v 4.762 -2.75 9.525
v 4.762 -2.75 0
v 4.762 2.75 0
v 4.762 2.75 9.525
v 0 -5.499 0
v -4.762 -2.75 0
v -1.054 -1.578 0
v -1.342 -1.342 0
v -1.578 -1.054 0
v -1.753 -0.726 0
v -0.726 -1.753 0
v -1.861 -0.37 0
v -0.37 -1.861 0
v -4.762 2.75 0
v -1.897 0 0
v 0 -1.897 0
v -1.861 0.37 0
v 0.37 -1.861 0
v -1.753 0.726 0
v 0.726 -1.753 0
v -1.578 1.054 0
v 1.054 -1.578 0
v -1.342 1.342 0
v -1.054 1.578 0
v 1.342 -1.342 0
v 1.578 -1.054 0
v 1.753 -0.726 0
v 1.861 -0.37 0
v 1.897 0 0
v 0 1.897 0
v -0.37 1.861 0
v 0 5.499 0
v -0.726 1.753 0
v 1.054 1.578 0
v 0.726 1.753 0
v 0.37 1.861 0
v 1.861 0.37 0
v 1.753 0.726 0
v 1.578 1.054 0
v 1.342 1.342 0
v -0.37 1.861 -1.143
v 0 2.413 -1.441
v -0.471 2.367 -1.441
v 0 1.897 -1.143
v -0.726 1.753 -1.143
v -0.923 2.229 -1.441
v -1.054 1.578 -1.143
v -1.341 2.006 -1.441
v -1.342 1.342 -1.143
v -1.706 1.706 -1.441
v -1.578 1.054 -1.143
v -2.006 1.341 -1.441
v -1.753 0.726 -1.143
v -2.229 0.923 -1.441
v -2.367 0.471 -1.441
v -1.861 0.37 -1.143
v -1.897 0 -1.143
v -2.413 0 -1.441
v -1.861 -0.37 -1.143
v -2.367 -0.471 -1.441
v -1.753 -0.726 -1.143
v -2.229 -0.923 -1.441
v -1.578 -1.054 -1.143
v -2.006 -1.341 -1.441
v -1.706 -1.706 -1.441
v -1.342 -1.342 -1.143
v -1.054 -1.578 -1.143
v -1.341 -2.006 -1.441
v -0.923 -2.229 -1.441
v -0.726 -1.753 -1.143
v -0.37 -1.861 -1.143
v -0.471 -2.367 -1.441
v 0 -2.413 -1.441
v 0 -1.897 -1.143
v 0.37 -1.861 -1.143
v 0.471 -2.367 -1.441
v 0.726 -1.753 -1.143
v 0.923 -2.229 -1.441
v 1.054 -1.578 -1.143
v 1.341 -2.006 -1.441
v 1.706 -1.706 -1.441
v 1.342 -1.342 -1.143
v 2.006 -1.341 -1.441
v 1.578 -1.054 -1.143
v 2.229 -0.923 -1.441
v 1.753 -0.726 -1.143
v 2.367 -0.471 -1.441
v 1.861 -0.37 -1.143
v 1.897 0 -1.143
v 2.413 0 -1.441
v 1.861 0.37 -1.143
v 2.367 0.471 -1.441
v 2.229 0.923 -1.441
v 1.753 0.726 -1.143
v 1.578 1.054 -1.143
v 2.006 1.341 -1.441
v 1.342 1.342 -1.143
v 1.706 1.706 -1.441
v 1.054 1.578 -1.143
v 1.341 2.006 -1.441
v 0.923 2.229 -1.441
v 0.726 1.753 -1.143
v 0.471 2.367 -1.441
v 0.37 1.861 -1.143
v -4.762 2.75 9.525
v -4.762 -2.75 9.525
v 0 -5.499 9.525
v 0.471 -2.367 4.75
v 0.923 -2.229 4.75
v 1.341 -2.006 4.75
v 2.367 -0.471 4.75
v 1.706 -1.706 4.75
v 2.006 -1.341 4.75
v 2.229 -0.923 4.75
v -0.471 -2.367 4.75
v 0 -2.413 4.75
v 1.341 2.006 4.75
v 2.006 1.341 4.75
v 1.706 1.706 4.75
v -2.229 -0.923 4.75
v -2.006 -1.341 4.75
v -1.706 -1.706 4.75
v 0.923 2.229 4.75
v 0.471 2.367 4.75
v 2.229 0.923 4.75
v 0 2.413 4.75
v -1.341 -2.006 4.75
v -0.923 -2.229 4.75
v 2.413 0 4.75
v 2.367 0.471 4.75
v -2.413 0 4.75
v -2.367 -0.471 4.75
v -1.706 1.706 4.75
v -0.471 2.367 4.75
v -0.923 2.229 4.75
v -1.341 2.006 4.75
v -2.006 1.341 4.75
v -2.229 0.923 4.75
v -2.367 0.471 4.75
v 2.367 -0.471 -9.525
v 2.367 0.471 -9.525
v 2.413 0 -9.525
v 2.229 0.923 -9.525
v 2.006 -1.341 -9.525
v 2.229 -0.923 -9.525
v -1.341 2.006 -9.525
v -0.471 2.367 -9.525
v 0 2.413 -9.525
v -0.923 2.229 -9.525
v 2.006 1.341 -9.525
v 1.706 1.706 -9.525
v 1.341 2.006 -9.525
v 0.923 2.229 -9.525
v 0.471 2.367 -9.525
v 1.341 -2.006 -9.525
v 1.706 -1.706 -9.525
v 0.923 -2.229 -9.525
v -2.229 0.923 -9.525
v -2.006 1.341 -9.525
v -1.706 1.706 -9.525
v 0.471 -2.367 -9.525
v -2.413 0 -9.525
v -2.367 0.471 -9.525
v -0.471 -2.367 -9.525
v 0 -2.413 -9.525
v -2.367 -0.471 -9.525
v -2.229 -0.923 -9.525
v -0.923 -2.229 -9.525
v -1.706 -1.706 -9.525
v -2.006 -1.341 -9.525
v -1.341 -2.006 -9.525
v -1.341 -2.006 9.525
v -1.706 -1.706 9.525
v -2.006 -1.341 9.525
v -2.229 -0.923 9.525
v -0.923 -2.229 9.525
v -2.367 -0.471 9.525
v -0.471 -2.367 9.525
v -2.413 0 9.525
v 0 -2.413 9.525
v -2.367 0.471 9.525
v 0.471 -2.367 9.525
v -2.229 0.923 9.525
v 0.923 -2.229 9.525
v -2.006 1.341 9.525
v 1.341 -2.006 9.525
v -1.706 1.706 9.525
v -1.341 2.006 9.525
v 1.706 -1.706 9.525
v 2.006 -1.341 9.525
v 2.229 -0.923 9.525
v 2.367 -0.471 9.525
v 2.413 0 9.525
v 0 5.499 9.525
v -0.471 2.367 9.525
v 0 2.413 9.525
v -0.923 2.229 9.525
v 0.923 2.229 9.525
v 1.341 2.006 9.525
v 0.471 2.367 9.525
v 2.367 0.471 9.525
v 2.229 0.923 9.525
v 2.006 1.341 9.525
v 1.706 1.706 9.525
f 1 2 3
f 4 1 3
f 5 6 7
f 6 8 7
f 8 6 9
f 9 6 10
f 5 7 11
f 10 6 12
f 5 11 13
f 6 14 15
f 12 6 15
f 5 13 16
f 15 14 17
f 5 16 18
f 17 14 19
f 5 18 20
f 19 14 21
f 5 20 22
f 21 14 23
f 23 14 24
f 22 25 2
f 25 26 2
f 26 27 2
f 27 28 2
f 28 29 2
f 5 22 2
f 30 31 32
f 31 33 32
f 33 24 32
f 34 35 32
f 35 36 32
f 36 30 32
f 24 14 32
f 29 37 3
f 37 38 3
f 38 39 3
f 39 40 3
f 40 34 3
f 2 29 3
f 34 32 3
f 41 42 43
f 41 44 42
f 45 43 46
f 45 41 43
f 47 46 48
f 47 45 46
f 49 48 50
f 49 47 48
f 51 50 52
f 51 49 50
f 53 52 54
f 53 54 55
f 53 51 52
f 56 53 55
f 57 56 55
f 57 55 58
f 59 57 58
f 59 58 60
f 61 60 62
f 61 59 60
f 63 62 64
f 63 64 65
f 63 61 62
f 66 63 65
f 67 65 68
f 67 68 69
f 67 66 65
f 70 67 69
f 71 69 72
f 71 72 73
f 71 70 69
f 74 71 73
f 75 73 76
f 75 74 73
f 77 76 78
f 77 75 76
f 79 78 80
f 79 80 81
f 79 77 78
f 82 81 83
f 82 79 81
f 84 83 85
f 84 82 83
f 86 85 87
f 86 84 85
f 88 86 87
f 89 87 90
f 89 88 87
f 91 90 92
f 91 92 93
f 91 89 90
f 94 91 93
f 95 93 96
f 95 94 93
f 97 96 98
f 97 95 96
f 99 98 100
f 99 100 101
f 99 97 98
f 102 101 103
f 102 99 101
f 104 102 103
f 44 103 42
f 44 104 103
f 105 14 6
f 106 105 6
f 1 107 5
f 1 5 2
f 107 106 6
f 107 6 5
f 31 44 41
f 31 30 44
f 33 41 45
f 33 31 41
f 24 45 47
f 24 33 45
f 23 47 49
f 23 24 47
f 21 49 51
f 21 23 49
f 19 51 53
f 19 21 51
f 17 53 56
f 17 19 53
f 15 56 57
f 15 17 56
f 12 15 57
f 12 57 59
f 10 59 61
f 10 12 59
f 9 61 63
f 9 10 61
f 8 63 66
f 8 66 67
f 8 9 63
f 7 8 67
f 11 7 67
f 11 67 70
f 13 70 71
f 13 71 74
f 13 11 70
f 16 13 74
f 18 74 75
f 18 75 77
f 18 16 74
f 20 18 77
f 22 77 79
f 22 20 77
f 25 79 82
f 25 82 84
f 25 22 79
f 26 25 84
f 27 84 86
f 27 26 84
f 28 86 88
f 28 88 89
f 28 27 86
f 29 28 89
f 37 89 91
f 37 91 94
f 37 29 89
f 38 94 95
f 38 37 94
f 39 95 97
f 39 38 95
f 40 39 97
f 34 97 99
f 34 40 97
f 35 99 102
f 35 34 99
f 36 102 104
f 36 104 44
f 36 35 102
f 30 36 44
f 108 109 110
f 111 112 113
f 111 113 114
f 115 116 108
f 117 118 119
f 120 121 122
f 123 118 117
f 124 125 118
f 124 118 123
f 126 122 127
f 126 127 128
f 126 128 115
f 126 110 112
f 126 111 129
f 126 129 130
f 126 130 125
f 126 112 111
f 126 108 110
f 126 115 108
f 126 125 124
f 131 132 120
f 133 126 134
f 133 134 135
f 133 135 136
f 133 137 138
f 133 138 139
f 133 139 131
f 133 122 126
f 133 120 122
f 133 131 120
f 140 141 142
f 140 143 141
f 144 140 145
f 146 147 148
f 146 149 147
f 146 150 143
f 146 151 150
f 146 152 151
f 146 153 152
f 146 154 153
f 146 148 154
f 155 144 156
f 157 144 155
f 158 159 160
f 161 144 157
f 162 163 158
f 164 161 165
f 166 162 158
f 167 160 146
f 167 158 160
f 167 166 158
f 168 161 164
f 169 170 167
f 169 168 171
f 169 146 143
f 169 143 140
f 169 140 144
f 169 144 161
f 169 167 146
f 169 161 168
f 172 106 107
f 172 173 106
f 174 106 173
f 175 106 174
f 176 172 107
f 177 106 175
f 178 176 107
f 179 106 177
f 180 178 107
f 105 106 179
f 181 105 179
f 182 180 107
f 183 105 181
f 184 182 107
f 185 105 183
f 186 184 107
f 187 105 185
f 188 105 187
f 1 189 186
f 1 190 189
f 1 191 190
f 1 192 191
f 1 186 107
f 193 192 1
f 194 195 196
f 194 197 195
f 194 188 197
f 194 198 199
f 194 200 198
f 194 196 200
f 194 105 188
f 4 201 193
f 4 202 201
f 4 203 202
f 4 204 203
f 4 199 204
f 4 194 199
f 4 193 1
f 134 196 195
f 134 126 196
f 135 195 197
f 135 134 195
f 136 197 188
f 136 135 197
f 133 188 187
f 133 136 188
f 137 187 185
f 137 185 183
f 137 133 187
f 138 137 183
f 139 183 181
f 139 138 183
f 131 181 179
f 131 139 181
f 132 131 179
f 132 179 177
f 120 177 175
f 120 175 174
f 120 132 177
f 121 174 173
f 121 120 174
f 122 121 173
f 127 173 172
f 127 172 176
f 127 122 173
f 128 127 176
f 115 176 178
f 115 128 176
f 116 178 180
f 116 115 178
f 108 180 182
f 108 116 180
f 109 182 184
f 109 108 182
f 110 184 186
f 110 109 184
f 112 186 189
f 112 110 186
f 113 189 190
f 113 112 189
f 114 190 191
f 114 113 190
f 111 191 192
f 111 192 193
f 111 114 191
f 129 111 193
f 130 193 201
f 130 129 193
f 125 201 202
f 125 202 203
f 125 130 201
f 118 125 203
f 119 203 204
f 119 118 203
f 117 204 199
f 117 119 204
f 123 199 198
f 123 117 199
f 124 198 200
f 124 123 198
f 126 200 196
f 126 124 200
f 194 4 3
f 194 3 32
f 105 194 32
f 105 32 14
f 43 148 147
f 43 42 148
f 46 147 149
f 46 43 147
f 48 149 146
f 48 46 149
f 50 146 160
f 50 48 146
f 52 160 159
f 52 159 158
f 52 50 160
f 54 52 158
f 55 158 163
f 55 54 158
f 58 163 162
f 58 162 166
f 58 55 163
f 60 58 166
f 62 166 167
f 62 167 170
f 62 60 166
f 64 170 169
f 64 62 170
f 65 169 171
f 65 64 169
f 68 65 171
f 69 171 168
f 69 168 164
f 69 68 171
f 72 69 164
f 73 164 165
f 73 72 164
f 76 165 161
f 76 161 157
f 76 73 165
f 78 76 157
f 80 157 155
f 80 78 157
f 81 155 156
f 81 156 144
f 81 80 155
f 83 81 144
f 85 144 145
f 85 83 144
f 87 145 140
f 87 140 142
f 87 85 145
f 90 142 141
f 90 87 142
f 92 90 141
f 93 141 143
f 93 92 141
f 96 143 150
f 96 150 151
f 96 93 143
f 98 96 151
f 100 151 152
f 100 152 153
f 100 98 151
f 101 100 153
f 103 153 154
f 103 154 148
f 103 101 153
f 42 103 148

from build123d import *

# Parameters (mm, degrees)
SKETCH4_R           = 3.58775
BOSS_EXTRUDE1_DEPTH = 9.525


with BuildPart() as part:
    # Sketch3 → Revolve1 (revolve)
    with BuildSketch(Plane(origin=(0, 0, 0), x_dir=(0, 0, -1), z_dir=(1, 0, 0))):
        Polygon((-4.7498, 2.413), (-4.7498, 0), (9.525, 0), (9.525, 2.413), (1.44065625, 2.413), (1.143, 1.897444252), (0, 1.897444252), (0, 4.7625), (-9.525, 4.7625), (-9.525, 2.413), align=None)
    revolve(axis=Axis((0, 0, -9.525), (0, 0, 1)))

    # Sketch4 → Boss-Extrude1 (add)
    with BuildSketch(Plane.XY.offset(9.525)):
        Polygon((-4.7625, 2.749630657), (-4.7625, -2.749630657), (0, -5.499261314), (4.7625, -2.749630657), (4.7625, 2.749630657), (0, 5.499261314), align=None)
        Circle(SKETCH4_R, mode=Mode.SUBTRACT)
    extrude(amount=-BOSS_EXTRUDE1_DEPTH)


solid = part.part
